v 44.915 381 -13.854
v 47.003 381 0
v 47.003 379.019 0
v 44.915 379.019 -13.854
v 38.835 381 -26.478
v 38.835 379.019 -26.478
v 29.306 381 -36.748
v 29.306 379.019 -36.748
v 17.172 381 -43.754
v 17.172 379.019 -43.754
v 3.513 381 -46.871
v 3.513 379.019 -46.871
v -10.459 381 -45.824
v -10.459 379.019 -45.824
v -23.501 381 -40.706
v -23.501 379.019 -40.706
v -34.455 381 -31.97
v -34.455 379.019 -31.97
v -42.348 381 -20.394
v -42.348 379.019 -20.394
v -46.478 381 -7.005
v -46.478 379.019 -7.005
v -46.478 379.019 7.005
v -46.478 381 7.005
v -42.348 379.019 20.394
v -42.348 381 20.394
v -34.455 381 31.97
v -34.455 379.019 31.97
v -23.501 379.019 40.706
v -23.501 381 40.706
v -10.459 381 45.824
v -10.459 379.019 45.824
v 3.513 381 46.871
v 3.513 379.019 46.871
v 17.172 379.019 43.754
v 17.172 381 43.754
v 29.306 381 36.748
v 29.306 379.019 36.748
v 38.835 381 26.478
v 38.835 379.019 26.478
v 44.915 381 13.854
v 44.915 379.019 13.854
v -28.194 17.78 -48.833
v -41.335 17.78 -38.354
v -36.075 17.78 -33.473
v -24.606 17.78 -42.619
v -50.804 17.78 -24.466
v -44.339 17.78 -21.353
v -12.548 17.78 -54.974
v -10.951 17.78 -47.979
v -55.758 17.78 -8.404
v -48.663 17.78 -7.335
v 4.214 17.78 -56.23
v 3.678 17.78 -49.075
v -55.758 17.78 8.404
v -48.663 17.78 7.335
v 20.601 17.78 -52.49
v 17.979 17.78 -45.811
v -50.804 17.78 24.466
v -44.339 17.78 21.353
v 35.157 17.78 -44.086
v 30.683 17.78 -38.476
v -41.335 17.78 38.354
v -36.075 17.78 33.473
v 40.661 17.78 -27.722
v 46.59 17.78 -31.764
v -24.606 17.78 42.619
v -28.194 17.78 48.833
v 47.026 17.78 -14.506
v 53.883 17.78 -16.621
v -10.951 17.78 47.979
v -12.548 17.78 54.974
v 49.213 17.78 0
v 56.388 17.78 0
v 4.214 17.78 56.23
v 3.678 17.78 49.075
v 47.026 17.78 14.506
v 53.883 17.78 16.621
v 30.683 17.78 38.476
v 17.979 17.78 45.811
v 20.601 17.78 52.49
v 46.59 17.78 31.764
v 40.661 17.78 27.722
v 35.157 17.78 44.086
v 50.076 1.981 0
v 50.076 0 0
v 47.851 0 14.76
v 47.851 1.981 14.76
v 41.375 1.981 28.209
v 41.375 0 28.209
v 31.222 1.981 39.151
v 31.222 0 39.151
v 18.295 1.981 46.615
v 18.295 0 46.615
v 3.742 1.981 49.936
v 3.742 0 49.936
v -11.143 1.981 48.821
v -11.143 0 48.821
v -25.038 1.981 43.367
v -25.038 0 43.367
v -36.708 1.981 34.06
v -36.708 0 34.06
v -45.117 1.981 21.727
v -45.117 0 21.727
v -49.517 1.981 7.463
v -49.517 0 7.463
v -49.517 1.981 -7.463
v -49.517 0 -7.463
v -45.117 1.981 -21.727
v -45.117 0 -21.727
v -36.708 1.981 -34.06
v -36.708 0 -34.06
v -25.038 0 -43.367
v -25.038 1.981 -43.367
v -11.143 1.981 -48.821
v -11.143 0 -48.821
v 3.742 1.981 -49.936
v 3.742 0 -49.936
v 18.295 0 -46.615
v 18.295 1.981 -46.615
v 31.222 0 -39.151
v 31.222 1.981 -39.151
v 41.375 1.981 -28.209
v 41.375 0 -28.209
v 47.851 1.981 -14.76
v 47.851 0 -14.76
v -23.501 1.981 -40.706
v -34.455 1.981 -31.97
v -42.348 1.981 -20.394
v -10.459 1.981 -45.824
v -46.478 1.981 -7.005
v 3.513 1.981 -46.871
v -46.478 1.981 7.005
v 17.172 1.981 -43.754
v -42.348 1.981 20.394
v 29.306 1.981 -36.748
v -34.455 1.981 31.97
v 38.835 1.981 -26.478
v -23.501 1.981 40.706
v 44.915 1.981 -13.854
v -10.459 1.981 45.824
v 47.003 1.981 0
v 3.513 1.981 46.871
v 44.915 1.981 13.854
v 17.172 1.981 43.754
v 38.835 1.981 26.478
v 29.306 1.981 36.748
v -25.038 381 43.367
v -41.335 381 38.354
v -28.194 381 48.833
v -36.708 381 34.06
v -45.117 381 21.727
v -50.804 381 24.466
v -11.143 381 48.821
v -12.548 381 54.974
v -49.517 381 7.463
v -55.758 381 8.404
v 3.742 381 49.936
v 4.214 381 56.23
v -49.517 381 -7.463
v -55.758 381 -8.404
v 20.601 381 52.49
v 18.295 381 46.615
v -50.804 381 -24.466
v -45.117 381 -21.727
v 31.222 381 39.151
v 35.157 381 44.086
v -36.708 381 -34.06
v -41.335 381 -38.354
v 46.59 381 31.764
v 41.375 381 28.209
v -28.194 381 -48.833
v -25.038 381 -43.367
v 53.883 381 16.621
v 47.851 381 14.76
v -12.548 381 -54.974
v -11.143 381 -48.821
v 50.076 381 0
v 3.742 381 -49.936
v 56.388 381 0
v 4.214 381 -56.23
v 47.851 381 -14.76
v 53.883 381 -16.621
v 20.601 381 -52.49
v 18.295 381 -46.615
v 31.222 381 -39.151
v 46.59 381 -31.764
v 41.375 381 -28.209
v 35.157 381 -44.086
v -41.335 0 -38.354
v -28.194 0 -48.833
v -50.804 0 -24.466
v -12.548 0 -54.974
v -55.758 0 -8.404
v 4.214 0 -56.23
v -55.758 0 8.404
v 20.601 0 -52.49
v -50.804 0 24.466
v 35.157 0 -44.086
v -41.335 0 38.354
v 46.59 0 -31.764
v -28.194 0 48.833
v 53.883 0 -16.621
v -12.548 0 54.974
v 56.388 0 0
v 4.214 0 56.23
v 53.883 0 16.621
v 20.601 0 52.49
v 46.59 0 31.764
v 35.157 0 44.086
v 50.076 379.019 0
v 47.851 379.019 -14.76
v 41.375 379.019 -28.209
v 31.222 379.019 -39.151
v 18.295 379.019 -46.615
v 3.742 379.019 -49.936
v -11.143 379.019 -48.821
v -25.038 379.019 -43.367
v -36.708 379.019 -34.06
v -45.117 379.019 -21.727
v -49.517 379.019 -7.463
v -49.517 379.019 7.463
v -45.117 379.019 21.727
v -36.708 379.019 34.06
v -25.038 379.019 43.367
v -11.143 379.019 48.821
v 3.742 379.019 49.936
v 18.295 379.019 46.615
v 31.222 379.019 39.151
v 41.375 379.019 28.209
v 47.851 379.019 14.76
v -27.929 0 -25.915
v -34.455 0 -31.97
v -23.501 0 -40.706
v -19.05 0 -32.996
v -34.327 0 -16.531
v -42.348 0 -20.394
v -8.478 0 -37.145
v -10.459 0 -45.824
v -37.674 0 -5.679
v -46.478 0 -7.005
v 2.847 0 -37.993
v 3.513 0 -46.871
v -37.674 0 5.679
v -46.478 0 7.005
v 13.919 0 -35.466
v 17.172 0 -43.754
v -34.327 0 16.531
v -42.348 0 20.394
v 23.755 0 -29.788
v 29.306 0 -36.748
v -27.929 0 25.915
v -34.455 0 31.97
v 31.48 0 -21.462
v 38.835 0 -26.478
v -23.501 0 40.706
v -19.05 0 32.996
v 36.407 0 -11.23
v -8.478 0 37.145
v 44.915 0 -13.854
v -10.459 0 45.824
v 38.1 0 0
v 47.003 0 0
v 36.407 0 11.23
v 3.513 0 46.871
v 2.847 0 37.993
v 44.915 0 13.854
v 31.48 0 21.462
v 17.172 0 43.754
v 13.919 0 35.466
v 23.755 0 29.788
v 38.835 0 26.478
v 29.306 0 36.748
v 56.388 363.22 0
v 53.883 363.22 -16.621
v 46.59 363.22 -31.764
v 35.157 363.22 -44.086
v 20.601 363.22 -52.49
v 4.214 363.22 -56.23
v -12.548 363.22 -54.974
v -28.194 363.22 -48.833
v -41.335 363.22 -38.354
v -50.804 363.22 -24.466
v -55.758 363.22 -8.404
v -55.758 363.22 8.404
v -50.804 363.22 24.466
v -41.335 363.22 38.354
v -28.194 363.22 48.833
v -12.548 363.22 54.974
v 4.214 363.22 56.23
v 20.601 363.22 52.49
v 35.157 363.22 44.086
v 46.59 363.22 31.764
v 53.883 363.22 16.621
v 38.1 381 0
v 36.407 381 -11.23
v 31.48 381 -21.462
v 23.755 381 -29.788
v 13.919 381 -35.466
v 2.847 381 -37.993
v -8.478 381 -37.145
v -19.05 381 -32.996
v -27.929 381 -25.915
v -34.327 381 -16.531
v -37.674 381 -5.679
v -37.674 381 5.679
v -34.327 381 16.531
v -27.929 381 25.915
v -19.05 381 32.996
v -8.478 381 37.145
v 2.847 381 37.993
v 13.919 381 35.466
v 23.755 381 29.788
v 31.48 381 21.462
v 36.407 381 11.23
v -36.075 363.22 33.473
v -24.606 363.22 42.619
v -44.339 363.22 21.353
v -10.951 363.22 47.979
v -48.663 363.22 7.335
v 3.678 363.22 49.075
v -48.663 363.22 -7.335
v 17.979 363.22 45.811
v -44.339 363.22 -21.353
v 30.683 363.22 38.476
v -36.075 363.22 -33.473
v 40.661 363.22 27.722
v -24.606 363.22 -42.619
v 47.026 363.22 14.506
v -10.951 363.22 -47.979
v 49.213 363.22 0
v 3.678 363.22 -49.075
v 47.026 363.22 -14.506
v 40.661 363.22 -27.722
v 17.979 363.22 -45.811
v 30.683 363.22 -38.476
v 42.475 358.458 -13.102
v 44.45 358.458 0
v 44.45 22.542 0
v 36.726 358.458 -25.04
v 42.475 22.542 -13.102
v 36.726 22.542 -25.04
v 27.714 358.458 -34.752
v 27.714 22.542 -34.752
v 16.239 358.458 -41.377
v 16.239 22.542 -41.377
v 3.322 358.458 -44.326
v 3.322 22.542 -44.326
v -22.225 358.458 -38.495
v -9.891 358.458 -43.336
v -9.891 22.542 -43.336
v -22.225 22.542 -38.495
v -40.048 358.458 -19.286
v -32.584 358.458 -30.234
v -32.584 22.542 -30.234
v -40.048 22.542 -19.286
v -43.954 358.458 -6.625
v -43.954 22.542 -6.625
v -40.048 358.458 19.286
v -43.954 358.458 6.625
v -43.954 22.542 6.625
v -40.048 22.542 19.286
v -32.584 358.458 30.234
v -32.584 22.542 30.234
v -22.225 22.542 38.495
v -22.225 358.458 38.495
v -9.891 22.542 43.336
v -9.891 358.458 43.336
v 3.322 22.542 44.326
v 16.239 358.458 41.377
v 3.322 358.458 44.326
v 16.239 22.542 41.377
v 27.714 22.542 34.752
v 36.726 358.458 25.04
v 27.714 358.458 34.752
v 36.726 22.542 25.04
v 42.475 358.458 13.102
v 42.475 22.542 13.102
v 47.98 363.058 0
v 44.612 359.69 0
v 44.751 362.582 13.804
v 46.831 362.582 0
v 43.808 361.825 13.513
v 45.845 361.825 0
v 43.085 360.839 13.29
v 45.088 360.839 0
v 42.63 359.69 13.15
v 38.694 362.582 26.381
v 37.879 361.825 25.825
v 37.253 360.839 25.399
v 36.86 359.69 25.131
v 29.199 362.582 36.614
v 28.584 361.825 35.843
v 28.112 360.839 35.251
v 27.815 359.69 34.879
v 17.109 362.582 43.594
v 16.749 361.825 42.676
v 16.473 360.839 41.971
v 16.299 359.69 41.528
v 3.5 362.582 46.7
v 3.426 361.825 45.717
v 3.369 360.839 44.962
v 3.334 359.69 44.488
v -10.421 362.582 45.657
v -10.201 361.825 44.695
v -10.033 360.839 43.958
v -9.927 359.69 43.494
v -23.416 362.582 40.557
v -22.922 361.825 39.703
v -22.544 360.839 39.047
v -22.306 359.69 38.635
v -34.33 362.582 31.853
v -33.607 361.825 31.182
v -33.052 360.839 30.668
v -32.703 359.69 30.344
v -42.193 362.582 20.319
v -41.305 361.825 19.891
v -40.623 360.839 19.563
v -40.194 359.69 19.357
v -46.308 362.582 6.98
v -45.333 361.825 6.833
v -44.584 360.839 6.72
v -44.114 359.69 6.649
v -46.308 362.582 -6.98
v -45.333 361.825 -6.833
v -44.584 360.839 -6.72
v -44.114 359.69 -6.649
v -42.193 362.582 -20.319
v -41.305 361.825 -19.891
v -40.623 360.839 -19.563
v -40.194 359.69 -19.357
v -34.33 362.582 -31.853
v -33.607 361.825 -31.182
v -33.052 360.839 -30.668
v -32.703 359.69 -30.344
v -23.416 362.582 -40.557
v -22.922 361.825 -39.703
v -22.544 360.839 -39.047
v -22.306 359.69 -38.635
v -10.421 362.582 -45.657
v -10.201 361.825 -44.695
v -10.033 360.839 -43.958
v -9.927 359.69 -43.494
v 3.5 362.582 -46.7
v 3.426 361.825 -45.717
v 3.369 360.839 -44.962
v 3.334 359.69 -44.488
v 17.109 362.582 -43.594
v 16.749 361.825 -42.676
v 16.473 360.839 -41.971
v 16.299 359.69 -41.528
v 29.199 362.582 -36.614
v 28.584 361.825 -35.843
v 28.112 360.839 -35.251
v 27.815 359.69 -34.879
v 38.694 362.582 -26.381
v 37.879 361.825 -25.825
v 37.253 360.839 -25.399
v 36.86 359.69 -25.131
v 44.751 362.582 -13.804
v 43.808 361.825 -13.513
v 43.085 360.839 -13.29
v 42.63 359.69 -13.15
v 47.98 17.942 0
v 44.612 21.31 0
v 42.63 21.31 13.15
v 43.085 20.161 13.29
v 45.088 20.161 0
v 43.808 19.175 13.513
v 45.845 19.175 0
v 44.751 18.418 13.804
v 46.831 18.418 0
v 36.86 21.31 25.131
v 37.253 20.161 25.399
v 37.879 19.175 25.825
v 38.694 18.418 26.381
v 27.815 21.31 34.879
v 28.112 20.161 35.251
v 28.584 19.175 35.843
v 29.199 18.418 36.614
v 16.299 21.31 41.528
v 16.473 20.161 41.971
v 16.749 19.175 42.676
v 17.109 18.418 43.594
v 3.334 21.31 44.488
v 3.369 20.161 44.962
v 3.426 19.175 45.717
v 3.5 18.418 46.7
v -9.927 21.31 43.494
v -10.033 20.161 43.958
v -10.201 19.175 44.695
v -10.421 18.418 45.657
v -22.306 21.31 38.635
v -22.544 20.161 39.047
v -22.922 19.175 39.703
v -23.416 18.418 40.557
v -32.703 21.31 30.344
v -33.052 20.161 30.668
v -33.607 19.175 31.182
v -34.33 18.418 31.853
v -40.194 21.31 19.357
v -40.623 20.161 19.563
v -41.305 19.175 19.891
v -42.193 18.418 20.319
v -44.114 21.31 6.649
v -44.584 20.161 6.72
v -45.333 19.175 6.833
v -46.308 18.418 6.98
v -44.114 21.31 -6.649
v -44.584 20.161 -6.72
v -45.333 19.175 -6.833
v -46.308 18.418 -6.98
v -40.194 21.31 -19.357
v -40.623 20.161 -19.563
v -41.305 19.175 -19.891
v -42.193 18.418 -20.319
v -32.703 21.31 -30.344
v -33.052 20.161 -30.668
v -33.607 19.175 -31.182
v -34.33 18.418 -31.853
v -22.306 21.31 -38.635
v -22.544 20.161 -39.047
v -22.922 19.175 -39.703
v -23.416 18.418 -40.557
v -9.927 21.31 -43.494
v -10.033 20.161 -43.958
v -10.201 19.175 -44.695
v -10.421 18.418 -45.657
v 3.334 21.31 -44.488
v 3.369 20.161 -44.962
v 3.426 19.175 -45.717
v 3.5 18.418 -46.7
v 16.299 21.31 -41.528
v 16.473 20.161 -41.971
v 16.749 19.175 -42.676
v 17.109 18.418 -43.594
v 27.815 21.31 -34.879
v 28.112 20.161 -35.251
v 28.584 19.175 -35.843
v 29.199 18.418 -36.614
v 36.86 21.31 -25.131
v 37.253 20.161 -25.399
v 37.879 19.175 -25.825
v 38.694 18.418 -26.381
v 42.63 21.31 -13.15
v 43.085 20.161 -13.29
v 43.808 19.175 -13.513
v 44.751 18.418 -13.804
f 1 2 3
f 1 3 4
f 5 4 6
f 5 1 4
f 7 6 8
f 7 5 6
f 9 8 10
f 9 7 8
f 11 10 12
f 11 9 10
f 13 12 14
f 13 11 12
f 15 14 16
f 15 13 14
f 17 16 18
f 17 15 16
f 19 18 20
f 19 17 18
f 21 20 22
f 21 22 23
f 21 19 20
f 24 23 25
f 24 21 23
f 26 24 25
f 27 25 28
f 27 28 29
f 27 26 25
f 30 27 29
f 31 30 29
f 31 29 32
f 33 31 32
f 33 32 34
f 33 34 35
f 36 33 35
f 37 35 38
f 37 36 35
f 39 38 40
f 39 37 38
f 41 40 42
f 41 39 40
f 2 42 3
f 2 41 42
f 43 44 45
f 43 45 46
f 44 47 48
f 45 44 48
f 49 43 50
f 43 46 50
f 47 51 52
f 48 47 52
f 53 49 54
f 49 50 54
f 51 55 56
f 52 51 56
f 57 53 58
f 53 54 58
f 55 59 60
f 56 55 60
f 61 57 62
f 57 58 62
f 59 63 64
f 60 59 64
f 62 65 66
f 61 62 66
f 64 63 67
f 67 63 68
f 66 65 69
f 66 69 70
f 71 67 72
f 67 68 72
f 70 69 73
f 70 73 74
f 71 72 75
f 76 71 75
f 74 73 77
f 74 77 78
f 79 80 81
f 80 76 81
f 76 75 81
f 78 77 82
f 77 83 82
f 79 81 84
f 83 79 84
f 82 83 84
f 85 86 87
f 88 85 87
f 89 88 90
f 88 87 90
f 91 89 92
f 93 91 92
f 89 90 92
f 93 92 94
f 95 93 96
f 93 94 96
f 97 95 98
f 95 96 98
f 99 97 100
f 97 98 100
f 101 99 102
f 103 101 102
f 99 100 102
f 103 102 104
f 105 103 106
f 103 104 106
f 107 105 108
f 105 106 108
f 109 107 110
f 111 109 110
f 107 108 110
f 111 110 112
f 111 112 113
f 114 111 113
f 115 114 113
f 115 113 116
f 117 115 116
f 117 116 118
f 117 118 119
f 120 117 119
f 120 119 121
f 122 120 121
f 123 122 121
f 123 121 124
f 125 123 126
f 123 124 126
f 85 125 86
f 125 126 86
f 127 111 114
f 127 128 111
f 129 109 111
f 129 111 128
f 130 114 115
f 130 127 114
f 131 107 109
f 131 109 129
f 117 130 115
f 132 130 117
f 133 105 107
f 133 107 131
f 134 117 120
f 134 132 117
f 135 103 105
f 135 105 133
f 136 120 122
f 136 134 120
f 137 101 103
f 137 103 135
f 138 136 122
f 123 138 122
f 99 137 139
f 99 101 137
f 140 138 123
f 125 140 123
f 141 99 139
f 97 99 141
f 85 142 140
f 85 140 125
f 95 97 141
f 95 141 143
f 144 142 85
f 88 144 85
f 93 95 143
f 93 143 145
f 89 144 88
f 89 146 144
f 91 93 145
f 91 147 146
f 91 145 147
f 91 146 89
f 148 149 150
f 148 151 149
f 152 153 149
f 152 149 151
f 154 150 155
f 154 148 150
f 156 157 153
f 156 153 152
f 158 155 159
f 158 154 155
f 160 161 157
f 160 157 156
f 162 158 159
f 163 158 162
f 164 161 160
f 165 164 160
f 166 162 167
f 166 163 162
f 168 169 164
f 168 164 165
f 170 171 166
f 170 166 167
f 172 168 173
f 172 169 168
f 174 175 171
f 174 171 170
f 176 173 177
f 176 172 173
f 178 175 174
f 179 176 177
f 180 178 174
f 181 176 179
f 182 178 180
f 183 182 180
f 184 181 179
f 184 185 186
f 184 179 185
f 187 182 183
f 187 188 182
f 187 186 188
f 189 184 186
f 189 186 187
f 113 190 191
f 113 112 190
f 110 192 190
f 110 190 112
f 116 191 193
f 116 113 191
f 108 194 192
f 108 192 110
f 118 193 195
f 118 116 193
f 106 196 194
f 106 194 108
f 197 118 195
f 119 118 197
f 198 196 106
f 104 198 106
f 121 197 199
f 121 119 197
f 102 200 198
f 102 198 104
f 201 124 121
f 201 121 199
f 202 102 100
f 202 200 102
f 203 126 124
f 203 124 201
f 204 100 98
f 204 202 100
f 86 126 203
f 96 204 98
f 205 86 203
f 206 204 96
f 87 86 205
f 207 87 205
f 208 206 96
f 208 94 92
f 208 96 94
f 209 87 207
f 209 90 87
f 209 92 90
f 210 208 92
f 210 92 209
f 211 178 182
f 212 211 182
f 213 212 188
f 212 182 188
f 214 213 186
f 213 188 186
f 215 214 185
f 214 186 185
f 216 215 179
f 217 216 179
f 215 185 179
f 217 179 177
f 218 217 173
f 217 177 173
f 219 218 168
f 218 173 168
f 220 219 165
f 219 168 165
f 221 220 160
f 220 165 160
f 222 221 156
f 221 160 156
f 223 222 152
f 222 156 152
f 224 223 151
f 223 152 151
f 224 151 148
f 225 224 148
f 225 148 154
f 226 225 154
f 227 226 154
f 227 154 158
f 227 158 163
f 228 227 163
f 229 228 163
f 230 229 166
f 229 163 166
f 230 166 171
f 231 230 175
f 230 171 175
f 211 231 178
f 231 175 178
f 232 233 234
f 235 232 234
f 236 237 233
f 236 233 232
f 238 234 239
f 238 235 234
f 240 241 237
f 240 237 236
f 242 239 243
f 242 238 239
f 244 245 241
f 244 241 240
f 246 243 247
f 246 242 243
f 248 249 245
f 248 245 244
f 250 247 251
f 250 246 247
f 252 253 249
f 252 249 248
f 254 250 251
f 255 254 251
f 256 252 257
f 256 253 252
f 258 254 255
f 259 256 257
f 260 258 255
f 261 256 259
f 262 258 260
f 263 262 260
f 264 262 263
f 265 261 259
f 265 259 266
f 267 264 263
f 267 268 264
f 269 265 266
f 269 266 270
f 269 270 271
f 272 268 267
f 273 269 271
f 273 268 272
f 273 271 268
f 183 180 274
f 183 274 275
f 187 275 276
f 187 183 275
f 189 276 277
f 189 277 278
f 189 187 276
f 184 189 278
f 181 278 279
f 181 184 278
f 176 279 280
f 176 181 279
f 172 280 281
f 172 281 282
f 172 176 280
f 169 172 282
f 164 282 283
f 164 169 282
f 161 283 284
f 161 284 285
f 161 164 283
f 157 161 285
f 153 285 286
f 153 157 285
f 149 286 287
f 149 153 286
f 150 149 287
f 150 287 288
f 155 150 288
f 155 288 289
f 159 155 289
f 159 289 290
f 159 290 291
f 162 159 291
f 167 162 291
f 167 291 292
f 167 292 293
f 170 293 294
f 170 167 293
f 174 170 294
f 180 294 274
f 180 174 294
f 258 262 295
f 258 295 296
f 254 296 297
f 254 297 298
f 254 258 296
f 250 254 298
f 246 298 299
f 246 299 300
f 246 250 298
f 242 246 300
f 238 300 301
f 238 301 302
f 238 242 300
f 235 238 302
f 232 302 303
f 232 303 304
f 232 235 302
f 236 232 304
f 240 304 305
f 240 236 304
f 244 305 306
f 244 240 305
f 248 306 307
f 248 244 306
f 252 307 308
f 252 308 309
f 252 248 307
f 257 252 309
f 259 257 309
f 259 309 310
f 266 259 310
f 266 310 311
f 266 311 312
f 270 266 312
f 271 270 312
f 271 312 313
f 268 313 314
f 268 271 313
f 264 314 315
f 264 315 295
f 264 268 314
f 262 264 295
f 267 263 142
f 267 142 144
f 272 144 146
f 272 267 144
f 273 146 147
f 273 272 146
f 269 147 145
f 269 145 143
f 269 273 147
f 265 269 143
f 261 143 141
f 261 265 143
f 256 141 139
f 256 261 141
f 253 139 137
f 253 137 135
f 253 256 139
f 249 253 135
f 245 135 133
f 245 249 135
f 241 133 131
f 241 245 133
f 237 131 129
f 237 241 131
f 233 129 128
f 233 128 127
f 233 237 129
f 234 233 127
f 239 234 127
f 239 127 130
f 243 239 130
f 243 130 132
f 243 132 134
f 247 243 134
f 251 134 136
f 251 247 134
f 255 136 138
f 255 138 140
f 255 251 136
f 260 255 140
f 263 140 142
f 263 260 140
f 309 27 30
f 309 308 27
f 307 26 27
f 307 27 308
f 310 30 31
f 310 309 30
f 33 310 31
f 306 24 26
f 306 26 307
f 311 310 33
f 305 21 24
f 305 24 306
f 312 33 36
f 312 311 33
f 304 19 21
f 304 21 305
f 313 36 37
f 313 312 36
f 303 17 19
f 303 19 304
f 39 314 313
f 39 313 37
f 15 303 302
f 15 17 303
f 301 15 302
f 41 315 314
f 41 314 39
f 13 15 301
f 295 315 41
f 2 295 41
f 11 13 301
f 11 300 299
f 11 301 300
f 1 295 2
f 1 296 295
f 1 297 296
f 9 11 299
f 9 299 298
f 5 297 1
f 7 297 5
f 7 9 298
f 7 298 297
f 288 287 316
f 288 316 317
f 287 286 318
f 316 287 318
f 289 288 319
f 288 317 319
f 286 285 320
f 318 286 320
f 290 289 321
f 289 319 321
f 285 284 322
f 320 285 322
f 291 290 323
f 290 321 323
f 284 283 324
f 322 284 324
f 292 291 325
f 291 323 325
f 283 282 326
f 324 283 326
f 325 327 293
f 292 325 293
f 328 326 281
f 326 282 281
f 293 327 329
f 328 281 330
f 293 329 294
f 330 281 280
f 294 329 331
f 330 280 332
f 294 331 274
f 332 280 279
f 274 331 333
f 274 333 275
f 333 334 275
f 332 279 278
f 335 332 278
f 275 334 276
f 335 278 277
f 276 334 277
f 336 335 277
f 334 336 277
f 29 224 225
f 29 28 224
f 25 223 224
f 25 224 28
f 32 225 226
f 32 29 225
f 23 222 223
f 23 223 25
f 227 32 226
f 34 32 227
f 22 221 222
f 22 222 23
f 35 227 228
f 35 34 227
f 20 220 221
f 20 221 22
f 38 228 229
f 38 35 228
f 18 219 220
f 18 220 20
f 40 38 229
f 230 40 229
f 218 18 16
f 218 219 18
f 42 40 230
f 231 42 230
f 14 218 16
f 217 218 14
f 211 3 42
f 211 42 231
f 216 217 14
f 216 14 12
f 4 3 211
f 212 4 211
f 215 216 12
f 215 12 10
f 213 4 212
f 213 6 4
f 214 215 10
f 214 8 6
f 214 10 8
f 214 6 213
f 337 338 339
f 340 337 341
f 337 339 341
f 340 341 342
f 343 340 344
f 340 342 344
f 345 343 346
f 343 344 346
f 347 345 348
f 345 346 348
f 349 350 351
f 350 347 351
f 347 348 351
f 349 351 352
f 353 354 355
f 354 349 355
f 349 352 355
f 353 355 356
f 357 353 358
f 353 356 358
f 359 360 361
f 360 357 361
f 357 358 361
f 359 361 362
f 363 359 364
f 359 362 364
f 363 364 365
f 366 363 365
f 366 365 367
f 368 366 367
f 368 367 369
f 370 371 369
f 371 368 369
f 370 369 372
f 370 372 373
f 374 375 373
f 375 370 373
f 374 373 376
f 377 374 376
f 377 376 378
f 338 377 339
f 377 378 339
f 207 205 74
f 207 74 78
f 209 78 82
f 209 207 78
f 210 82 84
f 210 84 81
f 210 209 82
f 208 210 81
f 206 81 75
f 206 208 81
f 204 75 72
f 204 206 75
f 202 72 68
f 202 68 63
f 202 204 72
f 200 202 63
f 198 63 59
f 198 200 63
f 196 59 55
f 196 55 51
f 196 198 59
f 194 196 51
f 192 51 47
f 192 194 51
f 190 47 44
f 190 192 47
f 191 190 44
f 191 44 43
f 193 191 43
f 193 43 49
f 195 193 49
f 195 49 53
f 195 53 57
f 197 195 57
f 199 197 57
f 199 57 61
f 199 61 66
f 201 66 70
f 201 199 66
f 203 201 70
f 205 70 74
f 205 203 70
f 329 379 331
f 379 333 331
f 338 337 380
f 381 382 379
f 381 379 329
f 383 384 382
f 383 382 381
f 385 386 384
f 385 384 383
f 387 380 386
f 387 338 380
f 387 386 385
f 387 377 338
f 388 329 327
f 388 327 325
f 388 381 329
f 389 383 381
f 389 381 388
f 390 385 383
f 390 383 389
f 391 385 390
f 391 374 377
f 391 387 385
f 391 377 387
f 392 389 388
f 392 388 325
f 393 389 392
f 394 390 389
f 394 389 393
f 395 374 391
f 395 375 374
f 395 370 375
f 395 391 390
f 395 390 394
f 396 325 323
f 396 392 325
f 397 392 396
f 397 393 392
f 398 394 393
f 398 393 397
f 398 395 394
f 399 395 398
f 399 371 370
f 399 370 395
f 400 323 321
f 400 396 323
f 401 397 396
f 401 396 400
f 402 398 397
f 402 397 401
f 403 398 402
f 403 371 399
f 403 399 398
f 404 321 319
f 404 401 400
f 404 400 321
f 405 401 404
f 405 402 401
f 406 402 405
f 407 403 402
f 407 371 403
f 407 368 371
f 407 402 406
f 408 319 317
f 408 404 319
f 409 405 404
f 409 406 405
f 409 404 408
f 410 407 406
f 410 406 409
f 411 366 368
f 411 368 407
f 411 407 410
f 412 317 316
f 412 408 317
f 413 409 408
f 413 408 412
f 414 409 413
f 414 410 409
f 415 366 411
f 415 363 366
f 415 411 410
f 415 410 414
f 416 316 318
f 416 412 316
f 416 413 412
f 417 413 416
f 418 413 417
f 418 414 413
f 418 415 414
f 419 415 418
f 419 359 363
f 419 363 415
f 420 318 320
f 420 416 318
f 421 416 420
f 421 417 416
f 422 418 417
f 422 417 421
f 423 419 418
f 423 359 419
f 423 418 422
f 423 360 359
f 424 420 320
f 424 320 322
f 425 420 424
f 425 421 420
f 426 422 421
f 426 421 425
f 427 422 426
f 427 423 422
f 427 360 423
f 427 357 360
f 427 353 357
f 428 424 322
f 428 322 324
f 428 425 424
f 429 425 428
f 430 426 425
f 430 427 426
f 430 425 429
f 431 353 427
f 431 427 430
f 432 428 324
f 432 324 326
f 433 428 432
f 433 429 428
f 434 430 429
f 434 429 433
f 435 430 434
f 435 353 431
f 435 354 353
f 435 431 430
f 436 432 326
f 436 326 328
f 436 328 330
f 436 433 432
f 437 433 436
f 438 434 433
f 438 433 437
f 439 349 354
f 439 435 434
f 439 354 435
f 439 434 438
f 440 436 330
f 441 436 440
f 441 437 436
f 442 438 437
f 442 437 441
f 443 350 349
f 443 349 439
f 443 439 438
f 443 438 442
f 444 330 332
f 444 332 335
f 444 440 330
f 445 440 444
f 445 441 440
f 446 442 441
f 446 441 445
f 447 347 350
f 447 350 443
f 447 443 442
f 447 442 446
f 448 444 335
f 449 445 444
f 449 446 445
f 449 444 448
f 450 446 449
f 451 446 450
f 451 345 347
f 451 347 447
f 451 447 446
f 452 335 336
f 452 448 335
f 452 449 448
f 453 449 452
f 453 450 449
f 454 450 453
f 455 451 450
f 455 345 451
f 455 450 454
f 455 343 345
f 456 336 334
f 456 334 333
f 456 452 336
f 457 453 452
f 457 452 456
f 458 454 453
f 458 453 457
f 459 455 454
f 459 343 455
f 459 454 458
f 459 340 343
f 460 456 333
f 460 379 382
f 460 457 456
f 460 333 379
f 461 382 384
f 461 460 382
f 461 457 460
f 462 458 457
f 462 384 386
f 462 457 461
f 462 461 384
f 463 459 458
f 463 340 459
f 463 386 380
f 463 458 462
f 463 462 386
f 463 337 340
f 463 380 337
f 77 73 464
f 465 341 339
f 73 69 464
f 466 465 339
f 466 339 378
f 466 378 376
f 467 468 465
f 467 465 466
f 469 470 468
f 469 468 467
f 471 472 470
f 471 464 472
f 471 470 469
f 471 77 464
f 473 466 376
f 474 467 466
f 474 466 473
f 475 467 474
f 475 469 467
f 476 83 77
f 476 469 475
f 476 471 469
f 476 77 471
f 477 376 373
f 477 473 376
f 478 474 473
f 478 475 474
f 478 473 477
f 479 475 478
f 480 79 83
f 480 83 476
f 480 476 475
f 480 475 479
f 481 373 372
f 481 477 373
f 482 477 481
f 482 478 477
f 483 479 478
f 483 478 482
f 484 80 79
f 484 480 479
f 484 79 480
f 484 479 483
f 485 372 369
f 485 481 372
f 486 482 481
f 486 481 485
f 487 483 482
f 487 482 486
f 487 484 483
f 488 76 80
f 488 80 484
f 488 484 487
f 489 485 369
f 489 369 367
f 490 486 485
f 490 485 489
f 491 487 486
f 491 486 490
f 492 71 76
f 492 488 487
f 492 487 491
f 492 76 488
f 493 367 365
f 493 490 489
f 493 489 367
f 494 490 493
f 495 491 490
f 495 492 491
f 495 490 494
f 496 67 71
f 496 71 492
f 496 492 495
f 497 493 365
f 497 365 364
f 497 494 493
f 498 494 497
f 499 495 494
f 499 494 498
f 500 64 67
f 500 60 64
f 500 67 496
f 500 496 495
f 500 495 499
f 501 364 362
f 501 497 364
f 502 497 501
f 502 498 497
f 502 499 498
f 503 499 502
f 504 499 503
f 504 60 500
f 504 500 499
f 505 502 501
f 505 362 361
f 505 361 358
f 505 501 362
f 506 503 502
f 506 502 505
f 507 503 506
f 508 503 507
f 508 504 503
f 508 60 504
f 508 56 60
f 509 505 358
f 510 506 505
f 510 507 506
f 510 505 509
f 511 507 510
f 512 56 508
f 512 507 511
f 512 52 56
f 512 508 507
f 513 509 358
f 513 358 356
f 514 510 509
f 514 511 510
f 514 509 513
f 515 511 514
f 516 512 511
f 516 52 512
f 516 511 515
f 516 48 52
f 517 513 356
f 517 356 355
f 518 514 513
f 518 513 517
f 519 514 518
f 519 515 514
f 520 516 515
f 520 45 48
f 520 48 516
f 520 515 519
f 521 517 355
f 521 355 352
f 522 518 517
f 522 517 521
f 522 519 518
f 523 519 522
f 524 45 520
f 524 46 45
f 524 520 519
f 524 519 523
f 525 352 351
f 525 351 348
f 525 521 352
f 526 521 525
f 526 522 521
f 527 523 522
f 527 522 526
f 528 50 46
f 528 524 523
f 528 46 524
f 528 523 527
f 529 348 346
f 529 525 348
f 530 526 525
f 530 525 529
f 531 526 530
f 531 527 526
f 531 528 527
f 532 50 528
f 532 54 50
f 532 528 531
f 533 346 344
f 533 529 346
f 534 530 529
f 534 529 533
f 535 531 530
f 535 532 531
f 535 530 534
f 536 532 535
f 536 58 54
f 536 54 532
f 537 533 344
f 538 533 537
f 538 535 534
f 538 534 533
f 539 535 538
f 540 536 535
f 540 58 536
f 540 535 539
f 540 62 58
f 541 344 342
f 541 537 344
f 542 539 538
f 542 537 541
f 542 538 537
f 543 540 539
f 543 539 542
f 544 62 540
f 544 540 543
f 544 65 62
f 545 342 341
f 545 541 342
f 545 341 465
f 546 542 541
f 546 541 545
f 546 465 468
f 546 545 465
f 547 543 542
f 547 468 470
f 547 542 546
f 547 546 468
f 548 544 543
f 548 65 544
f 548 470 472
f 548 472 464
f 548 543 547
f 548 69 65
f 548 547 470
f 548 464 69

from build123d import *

# Parameters (mm, degrees)
SKETCH2_R            = 44.45
SKETCH2_R_2          = 38.1
BASE_CYLINDER_DEPTH  = 381
SKETCH3_R            = 56.388
SKETCH3_R_2          = 41.275
AFT_FLANGE_DEPTH     = 17.78
FORWARD_START        = -17.78
SKETCH4_R            = 56.388
SKETCH4_R_2          = 41.275
FORWARD_FLANGE_DEPTH = 17.78
SKETCH6_R            = 50.0761
SKETCH6_R_2          = 47.0027
O_RING_SLOT_1_DEPTH  = 1.9812
O_RING_START         = -1.9812
SKETCH7_R            = 50.0761
SKETCH7_R_2          = 47.0027
O_RING_SLOT_2_DEPTH  = 1.9812
FILLET1_R            = 4.7625


with BuildPart() as part:
    # Sketch2 → Base Cylinder (new body)
    with BuildSketch(Plane(origin=(0, 0, 0), x_dir=(1, 0, 0), z_dir=(0, 1, 0))):
        Circle(SKETCH2_R)
        Circle(SKETCH2_R_2, mode=Mode.SUBTRACT)
    extrude(amount=BASE_CYLINDER_DEPTH)

    # Sketch3 → Aft Flange (add)
    with BuildSketch(Plane.XZ):
        Circle(SKETCH3_R)
        Circle(SKETCH3_R_2, mode=Mode.SUBTRACT)
    extrude(amount=-AFT_FLANGE_DEPTH)

    # Sketch4 → Forward Flange (add)
    with BuildSketch(Plane(origin=(0, 381, 0), x_dir=(1, 0, 0), z_dir=(0, 1, 0)).offset(FORWARD_START)):
        Circle(SKETCH4_R)
        Circle(SKETCH4_R_2, mode=Mode.SUBTRACT)
    extrude(amount=FORWARD_FLANGE_DEPTH)

    # Sketch6 → O-Ring Slot 1 (cut)
    with BuildSketch(Plane.XZ):
        Circle(SKETCH6_R)
        Circle(SKETCH6_R_2, mode=Mode.SUBTRACT)
    extrude(amount=-O_RING_SLOT_1_DEPTH, mode=Mode.SUBTRACT)

    # Sketch7 → O-Ring Slot 2 (cut)
    with BuildSketch(Plane(origin=(0, 381, 0), x_dir=(1, 0, 0), z_dir=(0, 1, 0)).offset(O_RING_START)):
        Circle(SKETCH7_R)
        Circle(SKETCH7_R_2, mode=Mode.SUBTRACT)
    extrude(amount=O_RING_SLOT_2_DEPTH, mode=Mode.SUBTRACT)

    # Fillet1
    fillet1_edges = [part.edges().sort_by_distance(p)[0] for p in [
        (-44.45, 17.78, 0),
        (-44.45, 363.22, 0),
    ]]
    fillet(fillet1_edges, radius=FILLET1_R)


solid = part.part
